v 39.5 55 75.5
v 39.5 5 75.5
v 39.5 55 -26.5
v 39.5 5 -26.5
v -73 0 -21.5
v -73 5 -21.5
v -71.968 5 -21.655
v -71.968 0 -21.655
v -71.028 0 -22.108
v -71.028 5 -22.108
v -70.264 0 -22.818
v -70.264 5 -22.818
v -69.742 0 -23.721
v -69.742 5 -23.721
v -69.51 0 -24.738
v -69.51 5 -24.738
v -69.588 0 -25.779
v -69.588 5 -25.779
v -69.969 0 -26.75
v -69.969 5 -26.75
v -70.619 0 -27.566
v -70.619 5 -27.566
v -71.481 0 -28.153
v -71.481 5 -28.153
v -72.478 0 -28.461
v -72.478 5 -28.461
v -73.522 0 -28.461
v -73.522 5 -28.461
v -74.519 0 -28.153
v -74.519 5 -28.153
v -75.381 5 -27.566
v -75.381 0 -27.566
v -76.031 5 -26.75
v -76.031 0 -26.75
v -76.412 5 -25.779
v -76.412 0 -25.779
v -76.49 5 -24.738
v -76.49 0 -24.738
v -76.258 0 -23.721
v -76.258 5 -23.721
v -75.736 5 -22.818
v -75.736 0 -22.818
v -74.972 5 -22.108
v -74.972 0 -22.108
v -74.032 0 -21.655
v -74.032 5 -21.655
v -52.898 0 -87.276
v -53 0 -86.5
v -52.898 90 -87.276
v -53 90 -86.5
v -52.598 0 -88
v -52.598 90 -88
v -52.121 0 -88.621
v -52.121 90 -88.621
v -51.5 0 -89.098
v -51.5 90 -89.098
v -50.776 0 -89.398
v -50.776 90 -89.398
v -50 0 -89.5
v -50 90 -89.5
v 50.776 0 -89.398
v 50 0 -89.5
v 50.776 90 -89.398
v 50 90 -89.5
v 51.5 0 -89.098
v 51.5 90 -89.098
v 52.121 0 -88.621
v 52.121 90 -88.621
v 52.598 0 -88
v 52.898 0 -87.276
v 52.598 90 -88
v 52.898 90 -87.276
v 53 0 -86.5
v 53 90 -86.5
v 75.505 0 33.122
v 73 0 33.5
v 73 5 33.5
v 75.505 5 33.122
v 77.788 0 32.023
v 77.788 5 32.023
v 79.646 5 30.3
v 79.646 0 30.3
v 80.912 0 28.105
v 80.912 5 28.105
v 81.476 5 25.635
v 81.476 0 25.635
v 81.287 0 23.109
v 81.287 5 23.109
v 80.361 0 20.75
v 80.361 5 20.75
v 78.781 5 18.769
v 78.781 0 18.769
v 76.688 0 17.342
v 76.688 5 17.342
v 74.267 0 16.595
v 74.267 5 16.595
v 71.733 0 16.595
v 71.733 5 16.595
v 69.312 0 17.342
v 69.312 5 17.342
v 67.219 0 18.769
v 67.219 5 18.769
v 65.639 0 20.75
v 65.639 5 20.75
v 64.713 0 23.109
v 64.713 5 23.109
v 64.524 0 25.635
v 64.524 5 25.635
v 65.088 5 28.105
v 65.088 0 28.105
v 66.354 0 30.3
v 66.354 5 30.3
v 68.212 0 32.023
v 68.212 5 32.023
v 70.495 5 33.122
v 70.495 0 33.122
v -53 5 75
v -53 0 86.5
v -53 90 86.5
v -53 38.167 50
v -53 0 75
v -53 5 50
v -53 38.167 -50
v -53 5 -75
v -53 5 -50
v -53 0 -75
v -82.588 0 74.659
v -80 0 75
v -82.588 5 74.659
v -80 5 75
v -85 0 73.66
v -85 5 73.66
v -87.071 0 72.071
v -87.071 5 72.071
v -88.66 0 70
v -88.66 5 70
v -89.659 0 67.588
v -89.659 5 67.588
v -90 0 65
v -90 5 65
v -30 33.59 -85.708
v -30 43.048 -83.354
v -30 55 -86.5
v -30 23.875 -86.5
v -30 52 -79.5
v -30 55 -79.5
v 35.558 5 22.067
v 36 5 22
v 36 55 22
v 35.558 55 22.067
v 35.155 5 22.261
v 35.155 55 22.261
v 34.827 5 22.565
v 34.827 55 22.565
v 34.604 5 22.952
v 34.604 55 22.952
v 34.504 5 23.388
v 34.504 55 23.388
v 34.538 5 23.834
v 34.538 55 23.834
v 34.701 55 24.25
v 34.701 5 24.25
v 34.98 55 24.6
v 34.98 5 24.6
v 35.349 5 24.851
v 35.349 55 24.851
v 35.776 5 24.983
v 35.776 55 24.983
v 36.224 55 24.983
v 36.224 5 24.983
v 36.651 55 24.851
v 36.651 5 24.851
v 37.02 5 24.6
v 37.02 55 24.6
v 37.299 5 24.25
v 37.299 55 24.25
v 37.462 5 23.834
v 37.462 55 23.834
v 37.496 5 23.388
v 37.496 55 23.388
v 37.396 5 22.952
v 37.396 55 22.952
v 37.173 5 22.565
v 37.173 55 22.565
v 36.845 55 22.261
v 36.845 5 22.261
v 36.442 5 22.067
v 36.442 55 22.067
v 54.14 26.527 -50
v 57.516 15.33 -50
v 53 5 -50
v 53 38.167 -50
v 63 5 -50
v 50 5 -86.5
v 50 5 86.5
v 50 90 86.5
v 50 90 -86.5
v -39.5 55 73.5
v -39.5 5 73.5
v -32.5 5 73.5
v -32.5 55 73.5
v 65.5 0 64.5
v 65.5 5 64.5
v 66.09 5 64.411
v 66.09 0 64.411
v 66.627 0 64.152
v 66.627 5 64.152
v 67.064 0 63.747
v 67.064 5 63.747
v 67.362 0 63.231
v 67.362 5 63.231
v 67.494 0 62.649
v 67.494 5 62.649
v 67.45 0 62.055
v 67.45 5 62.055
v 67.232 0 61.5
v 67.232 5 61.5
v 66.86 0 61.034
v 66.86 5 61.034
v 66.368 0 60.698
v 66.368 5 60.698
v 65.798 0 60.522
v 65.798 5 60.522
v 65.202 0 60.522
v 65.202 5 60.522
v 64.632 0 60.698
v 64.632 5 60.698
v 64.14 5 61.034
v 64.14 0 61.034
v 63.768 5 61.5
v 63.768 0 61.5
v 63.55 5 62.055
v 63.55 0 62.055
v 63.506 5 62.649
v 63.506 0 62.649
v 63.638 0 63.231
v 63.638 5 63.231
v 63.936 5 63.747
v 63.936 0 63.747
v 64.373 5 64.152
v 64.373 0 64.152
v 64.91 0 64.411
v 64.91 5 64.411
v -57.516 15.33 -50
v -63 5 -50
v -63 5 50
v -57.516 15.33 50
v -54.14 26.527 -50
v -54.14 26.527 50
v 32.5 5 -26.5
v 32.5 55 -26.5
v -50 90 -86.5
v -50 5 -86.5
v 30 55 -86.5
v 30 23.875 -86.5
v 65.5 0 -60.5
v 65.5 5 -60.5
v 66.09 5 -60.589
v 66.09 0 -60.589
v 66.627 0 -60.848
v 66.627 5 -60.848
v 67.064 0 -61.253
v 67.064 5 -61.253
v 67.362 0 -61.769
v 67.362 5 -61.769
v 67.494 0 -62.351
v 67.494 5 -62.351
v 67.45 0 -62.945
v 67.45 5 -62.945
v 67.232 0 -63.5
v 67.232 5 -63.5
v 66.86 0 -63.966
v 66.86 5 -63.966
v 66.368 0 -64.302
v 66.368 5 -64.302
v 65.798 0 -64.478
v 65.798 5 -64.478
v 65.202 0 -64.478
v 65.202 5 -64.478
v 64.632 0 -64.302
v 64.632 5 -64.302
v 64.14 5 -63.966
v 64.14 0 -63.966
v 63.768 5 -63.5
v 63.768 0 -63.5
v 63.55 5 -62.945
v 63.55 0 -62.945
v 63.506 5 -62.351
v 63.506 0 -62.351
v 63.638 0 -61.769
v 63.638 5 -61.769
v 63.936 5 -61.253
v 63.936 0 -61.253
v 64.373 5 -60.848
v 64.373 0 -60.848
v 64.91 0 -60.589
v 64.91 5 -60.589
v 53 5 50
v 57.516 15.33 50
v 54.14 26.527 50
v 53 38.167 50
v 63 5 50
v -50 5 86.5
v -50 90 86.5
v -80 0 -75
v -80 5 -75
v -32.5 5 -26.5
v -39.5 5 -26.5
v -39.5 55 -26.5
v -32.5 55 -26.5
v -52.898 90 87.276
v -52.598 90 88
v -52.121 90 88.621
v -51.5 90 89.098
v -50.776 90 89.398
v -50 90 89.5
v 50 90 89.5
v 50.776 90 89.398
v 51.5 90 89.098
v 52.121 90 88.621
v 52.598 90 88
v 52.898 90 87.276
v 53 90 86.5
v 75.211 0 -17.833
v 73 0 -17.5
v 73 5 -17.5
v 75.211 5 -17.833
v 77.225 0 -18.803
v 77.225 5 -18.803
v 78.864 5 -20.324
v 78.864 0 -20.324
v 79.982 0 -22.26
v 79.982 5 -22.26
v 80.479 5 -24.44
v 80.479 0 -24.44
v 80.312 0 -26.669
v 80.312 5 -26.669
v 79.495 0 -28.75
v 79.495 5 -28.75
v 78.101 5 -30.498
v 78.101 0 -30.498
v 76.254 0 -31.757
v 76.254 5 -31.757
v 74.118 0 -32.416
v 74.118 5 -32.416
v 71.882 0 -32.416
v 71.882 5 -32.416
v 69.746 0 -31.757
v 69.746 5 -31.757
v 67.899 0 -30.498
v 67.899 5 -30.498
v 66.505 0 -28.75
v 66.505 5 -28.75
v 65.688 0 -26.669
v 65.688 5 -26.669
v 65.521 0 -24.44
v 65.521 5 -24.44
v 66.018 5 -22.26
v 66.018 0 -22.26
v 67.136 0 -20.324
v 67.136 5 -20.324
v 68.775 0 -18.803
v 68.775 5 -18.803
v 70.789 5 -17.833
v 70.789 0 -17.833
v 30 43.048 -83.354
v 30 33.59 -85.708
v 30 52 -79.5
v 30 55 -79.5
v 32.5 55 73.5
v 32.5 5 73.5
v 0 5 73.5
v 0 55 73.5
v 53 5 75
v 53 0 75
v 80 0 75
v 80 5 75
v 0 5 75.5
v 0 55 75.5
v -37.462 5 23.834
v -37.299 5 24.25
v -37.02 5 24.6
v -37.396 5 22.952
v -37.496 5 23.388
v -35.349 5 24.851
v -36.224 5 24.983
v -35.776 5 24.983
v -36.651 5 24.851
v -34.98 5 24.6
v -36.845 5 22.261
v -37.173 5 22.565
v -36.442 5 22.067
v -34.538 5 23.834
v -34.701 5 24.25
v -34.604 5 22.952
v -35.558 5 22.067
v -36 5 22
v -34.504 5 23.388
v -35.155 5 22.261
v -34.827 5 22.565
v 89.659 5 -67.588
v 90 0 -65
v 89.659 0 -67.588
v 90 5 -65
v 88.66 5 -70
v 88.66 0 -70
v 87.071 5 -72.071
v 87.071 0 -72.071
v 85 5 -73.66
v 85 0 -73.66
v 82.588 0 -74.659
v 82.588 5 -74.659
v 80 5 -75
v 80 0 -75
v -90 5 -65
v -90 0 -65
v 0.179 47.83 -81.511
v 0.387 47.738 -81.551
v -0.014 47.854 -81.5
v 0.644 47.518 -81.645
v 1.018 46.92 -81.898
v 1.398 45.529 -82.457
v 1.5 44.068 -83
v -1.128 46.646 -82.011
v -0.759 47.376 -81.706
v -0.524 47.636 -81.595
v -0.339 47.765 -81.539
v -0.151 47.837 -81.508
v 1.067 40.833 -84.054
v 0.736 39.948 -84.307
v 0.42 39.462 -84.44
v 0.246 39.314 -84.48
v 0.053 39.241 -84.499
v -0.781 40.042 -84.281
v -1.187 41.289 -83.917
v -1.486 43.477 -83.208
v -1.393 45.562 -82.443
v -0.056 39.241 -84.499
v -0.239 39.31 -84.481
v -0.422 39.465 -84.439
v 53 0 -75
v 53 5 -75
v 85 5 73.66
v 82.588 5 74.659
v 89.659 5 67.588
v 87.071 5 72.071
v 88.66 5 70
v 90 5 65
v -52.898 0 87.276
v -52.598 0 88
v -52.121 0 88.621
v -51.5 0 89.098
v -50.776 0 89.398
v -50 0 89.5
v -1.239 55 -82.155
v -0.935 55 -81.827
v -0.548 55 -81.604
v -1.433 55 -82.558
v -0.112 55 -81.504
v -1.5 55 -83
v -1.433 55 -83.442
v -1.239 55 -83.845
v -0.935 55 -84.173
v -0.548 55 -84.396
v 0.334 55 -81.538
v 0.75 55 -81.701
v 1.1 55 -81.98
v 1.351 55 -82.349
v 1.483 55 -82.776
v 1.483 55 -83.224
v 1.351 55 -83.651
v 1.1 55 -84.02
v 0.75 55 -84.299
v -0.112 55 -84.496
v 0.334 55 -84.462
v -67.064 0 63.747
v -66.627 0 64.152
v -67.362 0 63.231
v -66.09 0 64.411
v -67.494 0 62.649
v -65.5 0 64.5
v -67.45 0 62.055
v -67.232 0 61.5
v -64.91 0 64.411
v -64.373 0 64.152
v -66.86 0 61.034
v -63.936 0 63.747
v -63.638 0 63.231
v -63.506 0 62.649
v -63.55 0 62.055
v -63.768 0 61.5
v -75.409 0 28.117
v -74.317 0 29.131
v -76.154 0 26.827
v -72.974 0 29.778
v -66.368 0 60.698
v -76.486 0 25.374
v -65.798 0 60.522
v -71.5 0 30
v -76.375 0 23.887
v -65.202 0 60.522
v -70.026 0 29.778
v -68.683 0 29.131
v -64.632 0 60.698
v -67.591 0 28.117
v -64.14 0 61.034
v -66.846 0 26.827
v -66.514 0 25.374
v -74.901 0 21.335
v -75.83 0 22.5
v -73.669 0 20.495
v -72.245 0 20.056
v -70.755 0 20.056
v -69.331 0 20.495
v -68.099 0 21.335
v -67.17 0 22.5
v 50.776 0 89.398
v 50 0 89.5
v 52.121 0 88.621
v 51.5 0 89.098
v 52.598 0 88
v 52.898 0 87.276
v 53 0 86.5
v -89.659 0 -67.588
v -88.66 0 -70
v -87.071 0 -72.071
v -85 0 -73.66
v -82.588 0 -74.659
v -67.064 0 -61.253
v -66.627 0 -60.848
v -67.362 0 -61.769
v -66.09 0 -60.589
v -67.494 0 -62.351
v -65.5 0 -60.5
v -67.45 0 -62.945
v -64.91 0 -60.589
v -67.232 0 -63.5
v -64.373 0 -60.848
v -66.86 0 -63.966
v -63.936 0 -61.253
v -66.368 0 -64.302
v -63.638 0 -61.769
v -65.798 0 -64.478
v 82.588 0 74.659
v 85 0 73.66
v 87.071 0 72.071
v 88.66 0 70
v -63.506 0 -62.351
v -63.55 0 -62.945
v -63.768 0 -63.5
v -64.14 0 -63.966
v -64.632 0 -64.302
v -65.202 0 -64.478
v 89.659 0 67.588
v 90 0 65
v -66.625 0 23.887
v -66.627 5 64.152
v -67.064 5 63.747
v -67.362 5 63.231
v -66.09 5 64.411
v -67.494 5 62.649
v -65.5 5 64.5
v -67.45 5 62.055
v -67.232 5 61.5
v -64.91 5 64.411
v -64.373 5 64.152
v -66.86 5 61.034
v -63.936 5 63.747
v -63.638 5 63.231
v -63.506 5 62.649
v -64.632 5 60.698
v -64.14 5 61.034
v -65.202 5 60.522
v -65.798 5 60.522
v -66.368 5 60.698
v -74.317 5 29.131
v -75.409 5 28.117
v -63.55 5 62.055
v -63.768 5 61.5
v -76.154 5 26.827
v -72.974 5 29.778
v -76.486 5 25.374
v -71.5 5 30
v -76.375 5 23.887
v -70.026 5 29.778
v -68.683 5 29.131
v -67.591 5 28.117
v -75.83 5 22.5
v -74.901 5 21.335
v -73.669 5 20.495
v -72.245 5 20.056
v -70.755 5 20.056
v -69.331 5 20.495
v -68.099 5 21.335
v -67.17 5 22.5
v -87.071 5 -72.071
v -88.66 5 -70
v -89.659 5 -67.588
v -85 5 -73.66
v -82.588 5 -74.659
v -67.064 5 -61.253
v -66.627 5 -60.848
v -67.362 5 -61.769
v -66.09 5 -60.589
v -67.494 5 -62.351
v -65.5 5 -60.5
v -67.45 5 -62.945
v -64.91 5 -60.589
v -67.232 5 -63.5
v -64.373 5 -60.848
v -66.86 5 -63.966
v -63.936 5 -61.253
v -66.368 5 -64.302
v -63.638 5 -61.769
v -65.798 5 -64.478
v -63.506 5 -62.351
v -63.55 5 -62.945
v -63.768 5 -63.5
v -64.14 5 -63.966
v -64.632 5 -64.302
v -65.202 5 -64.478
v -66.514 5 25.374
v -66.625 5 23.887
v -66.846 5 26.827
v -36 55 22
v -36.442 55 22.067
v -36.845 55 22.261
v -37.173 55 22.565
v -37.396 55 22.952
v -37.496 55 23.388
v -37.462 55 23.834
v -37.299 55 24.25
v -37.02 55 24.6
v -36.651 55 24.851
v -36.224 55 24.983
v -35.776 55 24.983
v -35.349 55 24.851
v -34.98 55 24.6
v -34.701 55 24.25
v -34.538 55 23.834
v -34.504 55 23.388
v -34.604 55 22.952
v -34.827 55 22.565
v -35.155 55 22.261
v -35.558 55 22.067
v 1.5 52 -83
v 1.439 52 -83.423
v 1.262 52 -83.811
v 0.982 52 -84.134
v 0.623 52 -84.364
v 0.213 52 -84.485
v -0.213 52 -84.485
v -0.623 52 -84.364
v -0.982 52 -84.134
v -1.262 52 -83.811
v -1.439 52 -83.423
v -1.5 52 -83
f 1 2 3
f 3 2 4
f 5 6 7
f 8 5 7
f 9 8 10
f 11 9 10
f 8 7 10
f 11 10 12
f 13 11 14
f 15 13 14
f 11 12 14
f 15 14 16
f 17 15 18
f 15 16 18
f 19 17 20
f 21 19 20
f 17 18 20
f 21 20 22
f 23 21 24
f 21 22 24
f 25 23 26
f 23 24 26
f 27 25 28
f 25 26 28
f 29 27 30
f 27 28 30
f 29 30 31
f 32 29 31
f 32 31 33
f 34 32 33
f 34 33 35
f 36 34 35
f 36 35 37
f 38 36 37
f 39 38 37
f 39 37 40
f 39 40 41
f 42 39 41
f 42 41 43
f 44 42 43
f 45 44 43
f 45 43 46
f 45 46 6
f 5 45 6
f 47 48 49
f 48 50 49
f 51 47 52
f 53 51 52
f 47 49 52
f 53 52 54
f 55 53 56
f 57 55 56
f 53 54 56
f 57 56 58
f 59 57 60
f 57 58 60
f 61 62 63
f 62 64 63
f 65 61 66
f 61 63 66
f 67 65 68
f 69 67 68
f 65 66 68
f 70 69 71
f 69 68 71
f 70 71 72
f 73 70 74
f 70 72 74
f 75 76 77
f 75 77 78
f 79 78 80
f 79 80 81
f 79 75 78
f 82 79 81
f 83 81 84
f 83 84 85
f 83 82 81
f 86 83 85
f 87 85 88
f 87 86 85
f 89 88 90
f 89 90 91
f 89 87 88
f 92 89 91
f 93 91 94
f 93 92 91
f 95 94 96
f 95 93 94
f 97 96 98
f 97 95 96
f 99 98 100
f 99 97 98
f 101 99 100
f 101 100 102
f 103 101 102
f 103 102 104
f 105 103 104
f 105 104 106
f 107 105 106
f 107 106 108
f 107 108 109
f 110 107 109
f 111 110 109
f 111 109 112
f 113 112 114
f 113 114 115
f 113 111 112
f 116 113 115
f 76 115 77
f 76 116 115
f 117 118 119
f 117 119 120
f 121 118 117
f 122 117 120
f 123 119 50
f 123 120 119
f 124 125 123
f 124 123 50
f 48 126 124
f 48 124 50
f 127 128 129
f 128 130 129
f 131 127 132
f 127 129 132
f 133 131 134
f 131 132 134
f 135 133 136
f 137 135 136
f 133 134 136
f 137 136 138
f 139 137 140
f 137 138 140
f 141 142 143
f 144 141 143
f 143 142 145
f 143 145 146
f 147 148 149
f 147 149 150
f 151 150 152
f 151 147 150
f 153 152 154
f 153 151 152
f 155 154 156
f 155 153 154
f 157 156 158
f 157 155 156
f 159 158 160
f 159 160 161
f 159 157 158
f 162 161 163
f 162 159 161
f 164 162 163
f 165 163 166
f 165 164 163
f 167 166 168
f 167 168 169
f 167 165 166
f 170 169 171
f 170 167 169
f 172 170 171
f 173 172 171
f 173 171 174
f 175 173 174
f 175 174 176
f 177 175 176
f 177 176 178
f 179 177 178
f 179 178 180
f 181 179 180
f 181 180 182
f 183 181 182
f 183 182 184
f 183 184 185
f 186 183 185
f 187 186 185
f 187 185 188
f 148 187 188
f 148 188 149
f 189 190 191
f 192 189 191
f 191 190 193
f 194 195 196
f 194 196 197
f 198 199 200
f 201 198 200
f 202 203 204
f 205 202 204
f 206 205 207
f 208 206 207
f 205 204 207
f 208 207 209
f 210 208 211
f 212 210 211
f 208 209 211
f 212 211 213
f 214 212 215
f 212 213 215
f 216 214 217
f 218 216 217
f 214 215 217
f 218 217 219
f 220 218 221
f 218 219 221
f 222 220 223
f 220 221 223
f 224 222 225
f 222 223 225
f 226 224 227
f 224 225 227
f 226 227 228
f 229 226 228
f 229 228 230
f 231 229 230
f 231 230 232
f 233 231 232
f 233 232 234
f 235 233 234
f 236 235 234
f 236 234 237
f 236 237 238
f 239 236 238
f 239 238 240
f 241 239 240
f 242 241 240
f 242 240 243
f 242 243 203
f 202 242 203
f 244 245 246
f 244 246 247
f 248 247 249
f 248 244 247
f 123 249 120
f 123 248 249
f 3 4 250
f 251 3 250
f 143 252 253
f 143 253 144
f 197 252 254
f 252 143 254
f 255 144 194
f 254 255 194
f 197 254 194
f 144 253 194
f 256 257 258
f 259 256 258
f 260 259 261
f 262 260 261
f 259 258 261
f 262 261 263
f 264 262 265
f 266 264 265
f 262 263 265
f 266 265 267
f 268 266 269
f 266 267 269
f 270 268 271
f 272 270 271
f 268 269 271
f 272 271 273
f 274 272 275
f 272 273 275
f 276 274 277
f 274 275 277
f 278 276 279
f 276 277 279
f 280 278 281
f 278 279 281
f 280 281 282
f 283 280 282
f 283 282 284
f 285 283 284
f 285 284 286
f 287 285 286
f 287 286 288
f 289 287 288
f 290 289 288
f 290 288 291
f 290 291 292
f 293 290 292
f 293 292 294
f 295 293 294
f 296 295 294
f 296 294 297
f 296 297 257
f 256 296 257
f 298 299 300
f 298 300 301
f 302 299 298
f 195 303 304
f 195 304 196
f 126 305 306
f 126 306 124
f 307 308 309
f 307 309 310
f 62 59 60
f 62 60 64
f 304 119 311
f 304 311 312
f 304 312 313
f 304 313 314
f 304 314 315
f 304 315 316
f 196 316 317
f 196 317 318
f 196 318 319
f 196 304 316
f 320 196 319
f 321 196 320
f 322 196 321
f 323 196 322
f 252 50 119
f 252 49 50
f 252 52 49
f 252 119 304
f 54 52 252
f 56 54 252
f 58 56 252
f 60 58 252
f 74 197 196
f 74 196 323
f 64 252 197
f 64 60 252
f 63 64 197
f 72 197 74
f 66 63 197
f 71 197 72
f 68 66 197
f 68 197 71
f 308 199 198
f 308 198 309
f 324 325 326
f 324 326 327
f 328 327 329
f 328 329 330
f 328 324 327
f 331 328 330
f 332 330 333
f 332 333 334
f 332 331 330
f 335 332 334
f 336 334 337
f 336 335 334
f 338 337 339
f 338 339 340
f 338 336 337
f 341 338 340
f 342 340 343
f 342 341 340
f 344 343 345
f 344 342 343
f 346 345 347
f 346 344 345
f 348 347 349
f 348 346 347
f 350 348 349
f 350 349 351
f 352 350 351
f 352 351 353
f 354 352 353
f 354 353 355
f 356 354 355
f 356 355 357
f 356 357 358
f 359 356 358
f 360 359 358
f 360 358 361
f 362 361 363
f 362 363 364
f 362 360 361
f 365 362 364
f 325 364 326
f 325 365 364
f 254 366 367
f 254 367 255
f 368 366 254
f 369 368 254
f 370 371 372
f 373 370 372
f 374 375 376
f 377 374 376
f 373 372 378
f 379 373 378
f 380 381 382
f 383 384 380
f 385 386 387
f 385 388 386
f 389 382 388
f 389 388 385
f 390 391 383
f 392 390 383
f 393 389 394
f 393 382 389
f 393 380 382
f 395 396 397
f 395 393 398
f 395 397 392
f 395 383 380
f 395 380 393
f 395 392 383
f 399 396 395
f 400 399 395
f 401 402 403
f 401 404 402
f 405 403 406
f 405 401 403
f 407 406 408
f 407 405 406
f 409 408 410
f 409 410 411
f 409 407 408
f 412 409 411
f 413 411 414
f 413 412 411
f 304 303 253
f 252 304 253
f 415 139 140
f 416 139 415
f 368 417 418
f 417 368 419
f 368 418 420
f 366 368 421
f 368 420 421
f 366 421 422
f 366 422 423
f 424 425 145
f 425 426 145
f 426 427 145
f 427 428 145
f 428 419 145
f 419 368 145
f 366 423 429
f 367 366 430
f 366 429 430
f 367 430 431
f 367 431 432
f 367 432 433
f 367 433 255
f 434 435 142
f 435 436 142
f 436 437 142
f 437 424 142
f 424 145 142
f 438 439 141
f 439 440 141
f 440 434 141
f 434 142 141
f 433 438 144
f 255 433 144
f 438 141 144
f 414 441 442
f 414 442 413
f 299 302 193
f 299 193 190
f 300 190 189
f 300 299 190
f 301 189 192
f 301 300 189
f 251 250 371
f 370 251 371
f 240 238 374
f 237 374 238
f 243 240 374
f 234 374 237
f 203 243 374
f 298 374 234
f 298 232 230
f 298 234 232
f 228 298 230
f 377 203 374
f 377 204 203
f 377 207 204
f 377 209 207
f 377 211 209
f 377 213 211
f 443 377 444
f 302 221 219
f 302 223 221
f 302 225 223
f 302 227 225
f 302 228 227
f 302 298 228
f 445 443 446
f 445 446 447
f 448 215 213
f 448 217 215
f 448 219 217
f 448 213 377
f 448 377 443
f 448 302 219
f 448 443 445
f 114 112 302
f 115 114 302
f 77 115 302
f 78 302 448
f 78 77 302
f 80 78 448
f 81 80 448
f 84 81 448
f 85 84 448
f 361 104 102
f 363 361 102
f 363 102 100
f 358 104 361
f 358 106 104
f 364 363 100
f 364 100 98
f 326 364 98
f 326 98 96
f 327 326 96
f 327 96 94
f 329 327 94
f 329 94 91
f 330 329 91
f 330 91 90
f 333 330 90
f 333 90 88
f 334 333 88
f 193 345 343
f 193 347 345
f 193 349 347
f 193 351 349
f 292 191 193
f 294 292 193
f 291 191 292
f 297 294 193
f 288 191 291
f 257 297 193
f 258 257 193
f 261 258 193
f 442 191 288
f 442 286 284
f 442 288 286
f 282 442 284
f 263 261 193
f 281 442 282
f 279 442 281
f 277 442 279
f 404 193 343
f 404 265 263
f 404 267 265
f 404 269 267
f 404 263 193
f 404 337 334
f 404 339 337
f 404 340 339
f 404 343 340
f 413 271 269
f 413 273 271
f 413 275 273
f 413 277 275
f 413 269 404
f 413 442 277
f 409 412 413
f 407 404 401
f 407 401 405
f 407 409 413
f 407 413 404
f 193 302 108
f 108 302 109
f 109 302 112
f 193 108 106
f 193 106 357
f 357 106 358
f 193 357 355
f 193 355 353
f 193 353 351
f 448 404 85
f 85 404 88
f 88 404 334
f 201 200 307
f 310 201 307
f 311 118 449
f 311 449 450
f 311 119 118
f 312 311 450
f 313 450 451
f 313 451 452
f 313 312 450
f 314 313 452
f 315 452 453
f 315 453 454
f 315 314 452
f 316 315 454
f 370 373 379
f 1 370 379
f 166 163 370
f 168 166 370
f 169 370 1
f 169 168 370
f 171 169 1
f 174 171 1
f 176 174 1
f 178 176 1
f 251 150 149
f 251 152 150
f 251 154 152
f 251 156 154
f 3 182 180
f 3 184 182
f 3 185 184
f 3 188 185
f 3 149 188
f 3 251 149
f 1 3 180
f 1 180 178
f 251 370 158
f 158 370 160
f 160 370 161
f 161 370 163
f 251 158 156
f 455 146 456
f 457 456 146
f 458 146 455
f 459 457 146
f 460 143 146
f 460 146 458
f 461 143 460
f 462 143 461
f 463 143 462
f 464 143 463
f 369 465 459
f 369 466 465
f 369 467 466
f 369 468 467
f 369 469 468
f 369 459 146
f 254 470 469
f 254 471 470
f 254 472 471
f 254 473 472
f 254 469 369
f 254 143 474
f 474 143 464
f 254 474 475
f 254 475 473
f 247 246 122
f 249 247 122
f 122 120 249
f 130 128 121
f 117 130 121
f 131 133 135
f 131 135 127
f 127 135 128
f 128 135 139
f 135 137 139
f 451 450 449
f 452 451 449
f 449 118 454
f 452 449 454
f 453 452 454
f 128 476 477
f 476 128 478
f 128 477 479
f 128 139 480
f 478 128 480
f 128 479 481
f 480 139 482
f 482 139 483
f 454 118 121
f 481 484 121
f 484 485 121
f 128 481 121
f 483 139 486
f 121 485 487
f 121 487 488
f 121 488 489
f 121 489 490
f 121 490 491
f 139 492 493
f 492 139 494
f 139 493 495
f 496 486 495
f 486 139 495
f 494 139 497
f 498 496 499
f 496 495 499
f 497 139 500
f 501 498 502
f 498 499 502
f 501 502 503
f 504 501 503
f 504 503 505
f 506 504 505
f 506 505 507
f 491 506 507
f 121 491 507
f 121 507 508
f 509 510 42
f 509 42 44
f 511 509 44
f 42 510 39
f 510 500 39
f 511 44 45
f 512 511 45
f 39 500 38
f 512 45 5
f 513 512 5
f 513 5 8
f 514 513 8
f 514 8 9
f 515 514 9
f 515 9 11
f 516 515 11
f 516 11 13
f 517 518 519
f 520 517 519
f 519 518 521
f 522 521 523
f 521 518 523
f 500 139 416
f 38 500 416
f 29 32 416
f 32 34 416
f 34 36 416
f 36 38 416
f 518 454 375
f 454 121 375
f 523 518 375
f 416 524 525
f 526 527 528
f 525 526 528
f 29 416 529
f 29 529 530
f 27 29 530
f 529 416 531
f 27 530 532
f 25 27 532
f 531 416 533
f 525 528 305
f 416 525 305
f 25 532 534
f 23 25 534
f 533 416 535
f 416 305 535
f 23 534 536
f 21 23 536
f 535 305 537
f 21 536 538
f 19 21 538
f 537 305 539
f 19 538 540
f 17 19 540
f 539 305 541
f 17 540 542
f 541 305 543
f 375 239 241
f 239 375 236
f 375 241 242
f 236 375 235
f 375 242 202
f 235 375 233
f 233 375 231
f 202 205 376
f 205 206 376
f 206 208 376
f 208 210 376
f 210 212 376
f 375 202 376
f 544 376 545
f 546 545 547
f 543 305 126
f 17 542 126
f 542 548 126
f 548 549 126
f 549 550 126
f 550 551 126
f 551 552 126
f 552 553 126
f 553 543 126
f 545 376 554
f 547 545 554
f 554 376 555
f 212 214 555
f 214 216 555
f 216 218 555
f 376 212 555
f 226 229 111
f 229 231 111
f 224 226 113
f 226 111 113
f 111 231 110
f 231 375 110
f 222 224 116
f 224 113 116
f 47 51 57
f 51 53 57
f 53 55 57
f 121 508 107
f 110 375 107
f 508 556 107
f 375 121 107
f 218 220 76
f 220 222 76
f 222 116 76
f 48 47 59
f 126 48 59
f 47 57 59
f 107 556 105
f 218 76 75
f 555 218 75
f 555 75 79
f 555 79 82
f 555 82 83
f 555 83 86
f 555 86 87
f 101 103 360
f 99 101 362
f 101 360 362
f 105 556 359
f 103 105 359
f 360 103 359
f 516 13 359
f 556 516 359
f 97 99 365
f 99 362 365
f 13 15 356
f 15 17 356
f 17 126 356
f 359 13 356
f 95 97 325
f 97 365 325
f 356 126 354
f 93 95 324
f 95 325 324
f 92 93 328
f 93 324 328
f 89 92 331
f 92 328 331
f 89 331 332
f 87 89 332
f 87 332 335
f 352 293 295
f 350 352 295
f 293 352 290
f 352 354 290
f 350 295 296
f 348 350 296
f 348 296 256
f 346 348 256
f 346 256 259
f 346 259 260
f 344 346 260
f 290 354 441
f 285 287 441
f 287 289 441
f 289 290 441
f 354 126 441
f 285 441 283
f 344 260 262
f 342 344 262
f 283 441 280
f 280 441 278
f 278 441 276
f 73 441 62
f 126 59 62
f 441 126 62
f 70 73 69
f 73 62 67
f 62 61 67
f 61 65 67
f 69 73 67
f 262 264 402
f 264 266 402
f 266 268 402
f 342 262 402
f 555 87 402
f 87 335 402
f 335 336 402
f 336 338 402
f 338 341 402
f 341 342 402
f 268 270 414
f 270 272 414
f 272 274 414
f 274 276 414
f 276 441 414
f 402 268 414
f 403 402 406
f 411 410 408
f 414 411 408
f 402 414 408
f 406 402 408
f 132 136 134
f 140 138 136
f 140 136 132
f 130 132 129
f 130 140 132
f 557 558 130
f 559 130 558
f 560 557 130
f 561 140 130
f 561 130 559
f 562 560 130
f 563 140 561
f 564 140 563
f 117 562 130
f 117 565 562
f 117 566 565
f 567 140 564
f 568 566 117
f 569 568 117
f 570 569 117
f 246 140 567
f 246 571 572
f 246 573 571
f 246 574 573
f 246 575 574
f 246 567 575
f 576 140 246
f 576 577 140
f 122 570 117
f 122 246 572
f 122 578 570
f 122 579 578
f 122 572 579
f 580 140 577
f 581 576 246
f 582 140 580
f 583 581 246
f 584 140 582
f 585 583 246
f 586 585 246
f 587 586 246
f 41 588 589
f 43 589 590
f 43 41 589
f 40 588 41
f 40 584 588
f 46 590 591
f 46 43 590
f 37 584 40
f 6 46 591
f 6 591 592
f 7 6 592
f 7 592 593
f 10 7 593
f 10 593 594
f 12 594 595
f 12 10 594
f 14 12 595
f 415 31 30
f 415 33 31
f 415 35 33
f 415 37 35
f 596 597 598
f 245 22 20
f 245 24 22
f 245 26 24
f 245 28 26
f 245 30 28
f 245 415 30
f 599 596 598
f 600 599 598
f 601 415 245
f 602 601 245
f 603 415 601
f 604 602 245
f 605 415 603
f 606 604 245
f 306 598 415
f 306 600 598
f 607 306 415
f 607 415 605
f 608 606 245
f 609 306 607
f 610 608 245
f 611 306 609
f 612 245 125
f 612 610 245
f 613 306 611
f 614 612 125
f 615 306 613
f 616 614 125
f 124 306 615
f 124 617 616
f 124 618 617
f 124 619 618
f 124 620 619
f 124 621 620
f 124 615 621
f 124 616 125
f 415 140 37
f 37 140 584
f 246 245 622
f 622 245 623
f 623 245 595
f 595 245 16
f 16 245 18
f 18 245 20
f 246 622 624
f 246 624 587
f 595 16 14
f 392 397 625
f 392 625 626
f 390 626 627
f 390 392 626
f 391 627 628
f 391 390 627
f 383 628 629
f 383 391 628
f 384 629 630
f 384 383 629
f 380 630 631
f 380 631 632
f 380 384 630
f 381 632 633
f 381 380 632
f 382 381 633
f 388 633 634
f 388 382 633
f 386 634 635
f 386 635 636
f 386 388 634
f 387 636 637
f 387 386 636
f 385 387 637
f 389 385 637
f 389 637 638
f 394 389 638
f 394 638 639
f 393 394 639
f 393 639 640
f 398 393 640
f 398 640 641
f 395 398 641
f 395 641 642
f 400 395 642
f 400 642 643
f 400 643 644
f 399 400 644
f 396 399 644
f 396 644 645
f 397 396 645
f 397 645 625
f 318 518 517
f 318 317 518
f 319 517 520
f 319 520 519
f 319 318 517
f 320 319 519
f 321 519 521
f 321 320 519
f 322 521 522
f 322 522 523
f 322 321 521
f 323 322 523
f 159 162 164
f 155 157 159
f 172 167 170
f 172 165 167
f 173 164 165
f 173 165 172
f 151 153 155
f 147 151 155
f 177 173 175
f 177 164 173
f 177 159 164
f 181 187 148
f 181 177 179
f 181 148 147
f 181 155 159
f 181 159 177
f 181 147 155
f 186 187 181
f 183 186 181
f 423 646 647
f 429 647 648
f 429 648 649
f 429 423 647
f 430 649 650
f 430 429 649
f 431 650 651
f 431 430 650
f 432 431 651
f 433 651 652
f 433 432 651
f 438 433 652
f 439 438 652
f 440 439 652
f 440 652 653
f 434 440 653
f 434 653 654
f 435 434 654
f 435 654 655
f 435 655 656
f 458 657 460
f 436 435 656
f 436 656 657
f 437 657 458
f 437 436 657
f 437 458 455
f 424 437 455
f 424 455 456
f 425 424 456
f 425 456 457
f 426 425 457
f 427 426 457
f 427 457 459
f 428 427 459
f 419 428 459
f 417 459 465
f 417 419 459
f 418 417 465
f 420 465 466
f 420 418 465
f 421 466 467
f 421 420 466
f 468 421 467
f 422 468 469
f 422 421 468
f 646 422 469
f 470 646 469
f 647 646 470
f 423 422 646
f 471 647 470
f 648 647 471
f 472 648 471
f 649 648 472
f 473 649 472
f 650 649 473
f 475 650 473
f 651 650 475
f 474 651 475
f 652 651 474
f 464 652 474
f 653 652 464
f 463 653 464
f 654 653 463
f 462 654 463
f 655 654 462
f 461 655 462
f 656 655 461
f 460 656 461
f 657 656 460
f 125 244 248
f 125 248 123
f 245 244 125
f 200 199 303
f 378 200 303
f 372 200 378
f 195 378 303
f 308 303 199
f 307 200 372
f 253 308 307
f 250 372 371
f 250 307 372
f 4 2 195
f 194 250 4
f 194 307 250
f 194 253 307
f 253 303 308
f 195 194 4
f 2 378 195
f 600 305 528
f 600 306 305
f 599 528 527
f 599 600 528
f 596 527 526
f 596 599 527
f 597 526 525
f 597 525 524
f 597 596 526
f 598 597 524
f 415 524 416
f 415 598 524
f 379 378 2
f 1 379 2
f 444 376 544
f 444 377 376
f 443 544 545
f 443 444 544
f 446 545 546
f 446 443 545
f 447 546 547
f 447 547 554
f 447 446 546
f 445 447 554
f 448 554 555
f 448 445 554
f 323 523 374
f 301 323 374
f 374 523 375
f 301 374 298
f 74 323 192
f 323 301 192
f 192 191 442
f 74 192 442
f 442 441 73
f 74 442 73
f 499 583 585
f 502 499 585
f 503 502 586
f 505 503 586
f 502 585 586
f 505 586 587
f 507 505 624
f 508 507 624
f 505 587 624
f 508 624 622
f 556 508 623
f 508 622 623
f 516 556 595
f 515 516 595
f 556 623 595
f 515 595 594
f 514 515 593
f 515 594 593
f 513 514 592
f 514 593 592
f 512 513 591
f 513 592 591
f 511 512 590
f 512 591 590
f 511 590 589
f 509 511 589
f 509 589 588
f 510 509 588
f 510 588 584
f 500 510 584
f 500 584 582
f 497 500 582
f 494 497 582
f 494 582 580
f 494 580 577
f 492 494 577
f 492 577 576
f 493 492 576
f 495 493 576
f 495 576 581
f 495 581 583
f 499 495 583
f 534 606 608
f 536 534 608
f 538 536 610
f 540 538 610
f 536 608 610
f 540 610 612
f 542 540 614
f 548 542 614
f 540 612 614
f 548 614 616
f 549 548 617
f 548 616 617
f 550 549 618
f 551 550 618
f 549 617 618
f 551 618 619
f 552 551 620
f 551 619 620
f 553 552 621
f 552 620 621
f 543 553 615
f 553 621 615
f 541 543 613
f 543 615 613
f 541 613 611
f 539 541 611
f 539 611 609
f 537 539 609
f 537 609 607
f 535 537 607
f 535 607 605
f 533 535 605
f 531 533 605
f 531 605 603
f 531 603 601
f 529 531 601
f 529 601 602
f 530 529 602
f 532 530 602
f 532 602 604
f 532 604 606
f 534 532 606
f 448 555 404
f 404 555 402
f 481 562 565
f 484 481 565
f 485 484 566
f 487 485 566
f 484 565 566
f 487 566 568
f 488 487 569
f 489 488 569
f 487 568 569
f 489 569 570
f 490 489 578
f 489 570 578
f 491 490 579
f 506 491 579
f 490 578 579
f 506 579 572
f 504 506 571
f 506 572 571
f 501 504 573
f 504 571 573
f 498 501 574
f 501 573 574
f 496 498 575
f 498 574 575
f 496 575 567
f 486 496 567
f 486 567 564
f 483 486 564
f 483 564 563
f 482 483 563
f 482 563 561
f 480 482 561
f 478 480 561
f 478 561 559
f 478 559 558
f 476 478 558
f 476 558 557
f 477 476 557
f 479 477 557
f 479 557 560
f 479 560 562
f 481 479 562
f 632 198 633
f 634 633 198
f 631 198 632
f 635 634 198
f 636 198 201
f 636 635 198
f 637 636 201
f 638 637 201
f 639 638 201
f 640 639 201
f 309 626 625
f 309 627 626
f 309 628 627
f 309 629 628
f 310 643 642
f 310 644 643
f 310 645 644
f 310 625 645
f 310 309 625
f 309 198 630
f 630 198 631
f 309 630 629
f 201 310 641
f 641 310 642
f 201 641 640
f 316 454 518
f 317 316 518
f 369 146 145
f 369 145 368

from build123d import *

# Parameters (mm, degrees)
CROQUIS1_W                    = 100
CROQUIS1_H                    = 173
CROQUIS1_R                    = 1.5
SALIENTE_EXTRUIR7_DEPTH       = 3
CROQUIS1_13_W                 = 100
CROQUIS1_13_H                 = 173
SALIENTE_EXTRUIR8_DEPTH       = 5
CROQUIS1_16_W                 = 106
CROQUIS1_16_H                 = 179
CROQUIS1_16_W_2               = 100
CROQUIS1_16_H_2               = 173
SALIENTE_EXTRUIR9_DEPTH       = 90
REDONDEO1_R                   = 3
CROQUIS4_W                    = 37
CROQUIS4_H                    = 150
CROQUIS4_R                    = 7.5
CROQUIS4_R_2                  = 8.5
SALIENTE_EXTRUIR10_DEPTH      = 5
SALIENTE_EXTRUIR11_DEPTH      = 50
SALIENTE_EXTRUIR11_DEPTH_BACK = 50
REDONDEO2_R                   = 10
CROQUIS1_17_R                 = 1.5
CROQUIS1_17_W                 = 7
CROQUIS1_17_H                 = 100
SALIENTE_EXTRUIR12_DEPTH      = 55
CROQUIS12_W                   = 60
CROQUIS12_H                   = 3
SALIENTE_EXTRUIR13_DEPTH      = 7
CROQUIS16_R                   = 1.5
CORTAR_EXTRUIR5_DEPTH         = 10
CROQUIS17_R                   = 2
CORTAR_EXTRUIR6_DEPTH         = 10
CROQUIS19_R                   = 3.5
CROQUIS19_R_2                 = 5
CORTAR_EXTRUIR7_DEPTH         = 10
REDONDEO3_R                   = 60
REDONDEO4_START               = -30
REDONDEO4_DEPTH               = 28.499998795
REDONDEO4_START_2             = 1.500002077
REDONDEO4_2_DEPTH             = 28.499997923
REDONDEO4_START_3             = -1.500001205
REDONDEO4_3_DEPTH             = 3.000003282
REDONDEO4_START_4             = 23.875277779
REDONDEO4_4_OUTLINE_R         = 1.5
REDONDEO4_4_DEPTH             = 28.124722221


with BuildPart() as part:
    # Croquis1 → Saliente-Extruir7 (new body)
    with BuildSketch(Plane(origin=(0, 0, 0), x_dir=(1, 0, 0), z_dir=(0, 1, 0))):
        Rectangle(CROQUIS1_W, CROQUIS1_H)
        with Locations(Location((-36, -23.5, 0), (0, 0, 270))):
            Circle(CROQUIS1_R, mode=Mode.SUBTRACT)
        with Locations(Location((36, -23.5, 0), (0, 0, 270))):
            Circle(CROQUIS1_R, mode=Mode.SUBTRACT)
    extrude(amount=SALIENTE_EXTRUIR7_DEPTH)

    # Croquis1<13> → Saliente-Extruir8 (add)
    with BuildSketch(Plane(origin=(0, 0, 0), x_dir=(1, 0, 0), z_dir=(0, 1, 0))):
        Rectangle(CROQUIS1_13_W, CROQUIS1_13_H)
    extrude(amount=SALIENTE_EXTRUIR8_DEPTH)

    # Croquis1<16> → Saliente-Extruir9 (add)
    with BuildSketch(Plane(origin=(0, 0, 0), x_dir=(1, 0, 0), z_dir=(0, 1, 0))):
        Rectangle(CROQUIS1_16_W, CROQUIS1_16_H)
        Rectangle(CROQUIS1_16_W_2, CROQUIS1_16_H_2, mode=Mode.SUBTRACT)
    extrude(amount=SALIENTE_EXTRUIR9_DEPTH)

    # Redondeo1
    redondeo1_edges = [part.edges().sort_by_distance(p)[0] for p in [
        (-53, 45, 89.5),
        (53, 45, 89.5),
        (53, 45, -89.5),
        (-53, 45, -89.5),
    ]]
    fillet(redondeo1_edges, radius=REDONDEO1_R)

    # Croquis4 → Saliente-Extruir10 (add)
    # profile 1 of 2: a face of its own
    with BuildSketch(Plane(origin=(0, 0, 0), x_dir=(1, 0, 0), z_dir=(0, 1, 0))):
        with Locations((-71.5, 0)):
            Rectangle(CROQUIS4_W, CROQUIS4_H)
    # profile 2 of 2: a face of its own
    with BuildSketch(Plane(origin=(0, 0, 0), x_dir=(1, 0, 0), z_dir=(0, 1, 0))):
        with Locations((71.5, 0)):
            Rectangle(CROQUIS4_W, CROQUIS4_H)
        with Locations(Location((73, 25, 0), (0, 0, 270))):
            Circle(CROQUIS4_R, mode=Mode.SUBTRACT)
        with Locations(Location((73, -25, 0), (0, 0, 270))):
            Circle(CROQUIS4_R_2, mode=Mode.SUBTRACT)
    extrude(amount=SALIENTE_EXTRUIR10_DEPTH)

    # Croquis5 → Saliente-Extruir11 (add, two sides: drawn at the far end of the back side and taken through both)
    with BuildSketch(Plane.XY.offset(-SALIENTE_EXTRUIR11_DEPTH_BACK)):
        Polygon((-53, 5), (-53, 20), (-63, 5), align=None)
        Polygon((53, 5), (53, 20), (63, 5), align=None)
    extrude(amount=SALIENTE_EXTRUIR11_DEPTH + SALIENTE_EXTRUIR11_DEPTH_BACK)

    # Redondeo2
    redondeo2_edges = [part.edges().sort_by_distance(p)[0] for p in [
        (90, 2.5, 75),
        (90, 2.5, -75),
        (-90, 2.5, -75),
        (-90, 2.5, 75),
    ]]
    fillet(redondeo2_edges, radius=REDONDEO2_R)

    # Croquis1<17> → Saliente-Extruir12 (add)
    # profile 1 of 2: a face of its own
    with BuildSketch(Plane(origin=(0, 0, 0), x_dir=(1, 0, 0), z_dir=(0, 1, 0))):
        Polygon((32.5, -73.5), (0, -73.5), (0, -75.5), (39.5, -75.5), (39.5, 26.5), (32.5, 26.5), align=None)
        with Locations(Location((36, -23.5, 0), (0, 0, 90))):
            Circle(CROQUIS1_17_R, mode=Mode.SUBTRACT)
    # profile 2 of 2: a face of its own
    with BuildSketch(Plane(origin=(0, 0, 0), x_dir=(1, 0, 0), z_dir=(0, 1, 0))):
        with Locations((-36, -23.5)):
            Rectangle(CROQUIS1_17_W, CROQUIS1_17_H)
        with Locations(Location((-36, -23.5, 0), (0, 0, 90))):
            Circle(CROQUIS1_17_R, mode=Mode.SUBTRACT)
    extrude(amount=SALIENTE_EXTRUIR12_DEPTH)

    # Croquis12 → Saliente-Extruir13 (add)
    with BuildSketch(Plane.XY.offset(-86.5)):
        with Locations((0, 53.5)):
            Rectangle(CROQUIS12_W, CROQUIS12_H)
    extrude(amount=SALIENTE_EXTRUIR13_DEPTH)

    # Croquis16 → Cortar-Extruir5 (cut)
    with BuildSketch(Plane(origin=(0, 55, 0), x_dir=(1, 0, 0), z_dir=(0, 1, 0))):
        with Locations(Location((0, 83, 0), (0, 0, 180))):
            Circle(CROQUIS16_R)
    extrude(amount=-CORTAR_EXTRUIR5_DEPTH, mode=Mode.SUBTRACT)

    # Croquis17 → Cortar-Extruir6 (cut)
    with BuildSketch(Plane(origin=(0, 5, 0), x_dir=(1, 0, 0), z_dir=(0, 1, 0))):
        with Locations(Location((-65.5, 62.5, 0), (0, 0, 270))):
            Circle(CROQUIS17_R)
        with Locations(Location((65.5, 62.5, 0), (0, 0, 270))):
            Circle(CROQUIS17_R)
        with Locations(Location((65.5, -62.5, 0), (0, 0, 270))):
            Circle(CROQUIS17_R)
        with Locations(Location((-65.5, -62.5, 0), (0, 0, 270))):
            Circle(CROQUIS17_R)
    extrude(amount=-CORTAR_EXTRUIR6_DEPTH, mode=Mode.SUBTRACT)

    # Croquis19 → Cortar-Extruir7 (cut)
    with BuildSketch(Plane(origin=(0, 5, 0), x_dir=(1, 0, 0), z_dir=(0, 1, 0))):
        with Locations(Location((-73, 25, 0), (0, 0, 270))):
            Circle(CROQUIS19_R)
        with Locations(Location((-71.5, -25, 0), (0, 0, 270))):
            Circle(CROQUIS19_R_2)
    extrude(amount=-CORTAR_EXTRUIR7_DEPTH, mode=Mode.SUBTRACT)

    # Redondeo3
    # the kernel refuses this fillet: 60 mm, written as the material it adds along each edge
    with BuildSketch(Plane(origin=(53, 20, 50), x_dir=(0, 1, 0), z_dir=(0, 0, -1)), Plane(origin=(-53, 20, -50), x_dir=(0, 1, 0), z_dir=(0, 0, 1))) as redondeo3_piece_1:
        with BuildLine():
            CenterArc((REDONDEO3_R * 0.302775637732, REDONDEO3_R), REDONDEO3_R, 236.309932474, 33.690067526)
            Line((-REDONDEO3_R * 0.251924558493, REDONDEO3_R * 0.167949705662), (0, 0))
            Line((0, 0), (REDONDEO3_R * 0.302775637732, 0))
        make_face()
    extrude(amount=100)

    # Redondeo4: read off the stored shape, not the designer's step
    # Redondeo4 outline → Redondeo4 (add)
    with BuildSketch(Plane.YZ.offset(REDONDEO4_START)):
        with BuildLine():
            ThreePointArc((52, -79.5), (38.366654525, -84.723706512), (23.875277779, -86.5))
            Line((23.875277779, -86.5), (52, -86.5))
            Line((52, -86.5), (52, -79.5))
        make_face()
    extrude(amount=REDONDEO4_DEPTH)

    # Redondeo4 2 outline → Redondeo4 2 (add)
    with BuildSketch(Plane.YZ.offset(REDONDEO4_START_2)):
        with BuildLine():
            ThreePointArc((52, -79.5), (38.366654525, -84.723706512), (23.875277779, -86.5))
            Line((23.875277779, -86.5), (52, -86.5))
            Line((52, -86.5), (52, -79.5))
        make_face()
    extrude(amount=REDONDEO4_2_DEPTH)

    # Redondeo4 3 outline → Redondeo4 3 (add)
    with BuildSketch(Plane.YZ.offset(REDONDEO4_START_3)):
        with BuildLine():
            ThreePointArc((52, -79.5), (38.366654525, -84.723706512), (23.875277779, -86.5))
            Line((23.875277779, -86.5), (52, -86.5))
            Line((52, -86.5), (52, -79.5))
        make_face()
    extrude(amount=REDONDEO4_3_DEPTH)

    # Redondeo4 4 outline → Redondeo4 4 (cut)
    with BuildSketch(Plane(origin=(0, 0, 0), x_dir=(1, 0, 0), z_dir=(0, 1, 0)).offset(REDONDEO4_START_4)):
        with Locations((0, 83)):
            Circle(REDONDEO4_4_OUTLINE_R)
    extrude(amount=REDONDEO4_4_DEPTH, mode=Mode.SUBTRACT)


solid = part.part
